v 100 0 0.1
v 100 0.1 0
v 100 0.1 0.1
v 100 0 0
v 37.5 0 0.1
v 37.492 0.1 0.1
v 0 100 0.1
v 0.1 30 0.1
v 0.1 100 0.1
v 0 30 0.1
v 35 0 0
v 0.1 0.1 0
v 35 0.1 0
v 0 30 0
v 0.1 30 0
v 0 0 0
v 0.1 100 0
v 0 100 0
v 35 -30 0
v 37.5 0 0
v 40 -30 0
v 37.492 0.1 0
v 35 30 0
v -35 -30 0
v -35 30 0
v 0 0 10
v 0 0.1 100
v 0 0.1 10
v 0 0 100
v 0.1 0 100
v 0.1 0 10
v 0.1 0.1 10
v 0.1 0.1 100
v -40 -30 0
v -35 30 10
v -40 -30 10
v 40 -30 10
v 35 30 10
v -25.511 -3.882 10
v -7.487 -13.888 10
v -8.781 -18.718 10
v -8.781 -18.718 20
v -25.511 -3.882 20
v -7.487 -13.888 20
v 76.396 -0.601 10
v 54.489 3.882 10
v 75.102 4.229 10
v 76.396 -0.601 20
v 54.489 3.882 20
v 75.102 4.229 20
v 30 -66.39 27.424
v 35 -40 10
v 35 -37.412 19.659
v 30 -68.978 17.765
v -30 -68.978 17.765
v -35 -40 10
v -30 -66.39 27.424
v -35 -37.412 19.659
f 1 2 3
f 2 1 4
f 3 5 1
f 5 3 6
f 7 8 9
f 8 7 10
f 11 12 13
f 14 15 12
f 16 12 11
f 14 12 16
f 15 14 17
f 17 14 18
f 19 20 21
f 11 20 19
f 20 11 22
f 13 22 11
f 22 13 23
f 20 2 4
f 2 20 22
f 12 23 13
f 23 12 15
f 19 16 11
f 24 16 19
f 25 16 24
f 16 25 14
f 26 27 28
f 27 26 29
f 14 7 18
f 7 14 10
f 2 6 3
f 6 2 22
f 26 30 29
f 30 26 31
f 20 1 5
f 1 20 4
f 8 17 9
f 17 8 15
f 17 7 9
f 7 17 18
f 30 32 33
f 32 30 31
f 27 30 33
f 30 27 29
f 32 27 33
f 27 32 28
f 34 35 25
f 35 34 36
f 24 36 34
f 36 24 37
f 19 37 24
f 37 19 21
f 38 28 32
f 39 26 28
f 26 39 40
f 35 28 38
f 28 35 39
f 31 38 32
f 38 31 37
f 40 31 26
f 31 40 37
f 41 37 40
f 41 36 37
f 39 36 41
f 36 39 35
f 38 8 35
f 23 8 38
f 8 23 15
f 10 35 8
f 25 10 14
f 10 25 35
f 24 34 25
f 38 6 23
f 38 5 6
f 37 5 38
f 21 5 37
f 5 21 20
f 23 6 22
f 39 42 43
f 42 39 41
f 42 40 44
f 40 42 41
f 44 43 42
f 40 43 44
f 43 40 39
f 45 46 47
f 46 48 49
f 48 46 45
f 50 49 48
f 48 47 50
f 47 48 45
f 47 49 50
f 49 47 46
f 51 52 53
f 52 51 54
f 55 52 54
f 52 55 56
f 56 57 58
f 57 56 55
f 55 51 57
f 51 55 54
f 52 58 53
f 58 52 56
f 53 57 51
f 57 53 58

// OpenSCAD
    // Combined Scene

    // Permanent Model
    
    // Permanent Model (Black)
    color([0, 0, 0]) {
        // Your permanent model code here
        cube([100,0.1,0.1], center = false);
        cube([0.1,100,0.1], center = false);
        cube([0.1,0.1,100], center = false);
    }
    

    // Dynamic Model
    translate([0, 0, 0]) {
    // Chair Seat with Contour
    difference() {
        translate([0, 0, 0]) 
            linear_extrude(height=10) 
                polygon(points=[[35, 30], [-35, 30], [-40, -30], [40, -30]]);
        translate([0, 0, -5]) 
            cube([70, 60, 10], center=true);
    }

    // Ergonomic Backrest
    translate([0, -40, 10])
        rotate([-15, 0, 0])
        linear_extrude(height=10) 
            polygon(points=[[35, 0], [-35, 0], [-30, -30], [30, -30]]);

    // Armrests
    for (x = [-40, 40]) {
        translate([x, 0, 10]) {
            rotate([0, 0, x > 0 ? 15 : -15])
                linear_extrude(height=10) 
                    polygon(points=[[15, 0], [35, -10], [35, -5], [15, 0]]);
        }
    }

    // Sturdy Legs
    for (x = [-30, 30]) {
        for (y = [-25, 25]) {
            translate([x, y, -20]) {
                linear_extrude(height=25) {
                    polygon(points=[[0, 0], [8, -12], [4, -12], [12, 0]]);
                }
            }
        }
    }

    // Unique Cutout Design on Seat
    translate([0, 0, 0]) {
        difference() {
            translate([0, 0, 1]) 
                linear_extrude(height=9) 
                    polygon(points=[[-15, 8], [-15, -8], [15, -8], [15, 8]]);
            translate([0, 0, -1]) 
                cube([30, 16, 10], center=true);
        }
    }
}
    
